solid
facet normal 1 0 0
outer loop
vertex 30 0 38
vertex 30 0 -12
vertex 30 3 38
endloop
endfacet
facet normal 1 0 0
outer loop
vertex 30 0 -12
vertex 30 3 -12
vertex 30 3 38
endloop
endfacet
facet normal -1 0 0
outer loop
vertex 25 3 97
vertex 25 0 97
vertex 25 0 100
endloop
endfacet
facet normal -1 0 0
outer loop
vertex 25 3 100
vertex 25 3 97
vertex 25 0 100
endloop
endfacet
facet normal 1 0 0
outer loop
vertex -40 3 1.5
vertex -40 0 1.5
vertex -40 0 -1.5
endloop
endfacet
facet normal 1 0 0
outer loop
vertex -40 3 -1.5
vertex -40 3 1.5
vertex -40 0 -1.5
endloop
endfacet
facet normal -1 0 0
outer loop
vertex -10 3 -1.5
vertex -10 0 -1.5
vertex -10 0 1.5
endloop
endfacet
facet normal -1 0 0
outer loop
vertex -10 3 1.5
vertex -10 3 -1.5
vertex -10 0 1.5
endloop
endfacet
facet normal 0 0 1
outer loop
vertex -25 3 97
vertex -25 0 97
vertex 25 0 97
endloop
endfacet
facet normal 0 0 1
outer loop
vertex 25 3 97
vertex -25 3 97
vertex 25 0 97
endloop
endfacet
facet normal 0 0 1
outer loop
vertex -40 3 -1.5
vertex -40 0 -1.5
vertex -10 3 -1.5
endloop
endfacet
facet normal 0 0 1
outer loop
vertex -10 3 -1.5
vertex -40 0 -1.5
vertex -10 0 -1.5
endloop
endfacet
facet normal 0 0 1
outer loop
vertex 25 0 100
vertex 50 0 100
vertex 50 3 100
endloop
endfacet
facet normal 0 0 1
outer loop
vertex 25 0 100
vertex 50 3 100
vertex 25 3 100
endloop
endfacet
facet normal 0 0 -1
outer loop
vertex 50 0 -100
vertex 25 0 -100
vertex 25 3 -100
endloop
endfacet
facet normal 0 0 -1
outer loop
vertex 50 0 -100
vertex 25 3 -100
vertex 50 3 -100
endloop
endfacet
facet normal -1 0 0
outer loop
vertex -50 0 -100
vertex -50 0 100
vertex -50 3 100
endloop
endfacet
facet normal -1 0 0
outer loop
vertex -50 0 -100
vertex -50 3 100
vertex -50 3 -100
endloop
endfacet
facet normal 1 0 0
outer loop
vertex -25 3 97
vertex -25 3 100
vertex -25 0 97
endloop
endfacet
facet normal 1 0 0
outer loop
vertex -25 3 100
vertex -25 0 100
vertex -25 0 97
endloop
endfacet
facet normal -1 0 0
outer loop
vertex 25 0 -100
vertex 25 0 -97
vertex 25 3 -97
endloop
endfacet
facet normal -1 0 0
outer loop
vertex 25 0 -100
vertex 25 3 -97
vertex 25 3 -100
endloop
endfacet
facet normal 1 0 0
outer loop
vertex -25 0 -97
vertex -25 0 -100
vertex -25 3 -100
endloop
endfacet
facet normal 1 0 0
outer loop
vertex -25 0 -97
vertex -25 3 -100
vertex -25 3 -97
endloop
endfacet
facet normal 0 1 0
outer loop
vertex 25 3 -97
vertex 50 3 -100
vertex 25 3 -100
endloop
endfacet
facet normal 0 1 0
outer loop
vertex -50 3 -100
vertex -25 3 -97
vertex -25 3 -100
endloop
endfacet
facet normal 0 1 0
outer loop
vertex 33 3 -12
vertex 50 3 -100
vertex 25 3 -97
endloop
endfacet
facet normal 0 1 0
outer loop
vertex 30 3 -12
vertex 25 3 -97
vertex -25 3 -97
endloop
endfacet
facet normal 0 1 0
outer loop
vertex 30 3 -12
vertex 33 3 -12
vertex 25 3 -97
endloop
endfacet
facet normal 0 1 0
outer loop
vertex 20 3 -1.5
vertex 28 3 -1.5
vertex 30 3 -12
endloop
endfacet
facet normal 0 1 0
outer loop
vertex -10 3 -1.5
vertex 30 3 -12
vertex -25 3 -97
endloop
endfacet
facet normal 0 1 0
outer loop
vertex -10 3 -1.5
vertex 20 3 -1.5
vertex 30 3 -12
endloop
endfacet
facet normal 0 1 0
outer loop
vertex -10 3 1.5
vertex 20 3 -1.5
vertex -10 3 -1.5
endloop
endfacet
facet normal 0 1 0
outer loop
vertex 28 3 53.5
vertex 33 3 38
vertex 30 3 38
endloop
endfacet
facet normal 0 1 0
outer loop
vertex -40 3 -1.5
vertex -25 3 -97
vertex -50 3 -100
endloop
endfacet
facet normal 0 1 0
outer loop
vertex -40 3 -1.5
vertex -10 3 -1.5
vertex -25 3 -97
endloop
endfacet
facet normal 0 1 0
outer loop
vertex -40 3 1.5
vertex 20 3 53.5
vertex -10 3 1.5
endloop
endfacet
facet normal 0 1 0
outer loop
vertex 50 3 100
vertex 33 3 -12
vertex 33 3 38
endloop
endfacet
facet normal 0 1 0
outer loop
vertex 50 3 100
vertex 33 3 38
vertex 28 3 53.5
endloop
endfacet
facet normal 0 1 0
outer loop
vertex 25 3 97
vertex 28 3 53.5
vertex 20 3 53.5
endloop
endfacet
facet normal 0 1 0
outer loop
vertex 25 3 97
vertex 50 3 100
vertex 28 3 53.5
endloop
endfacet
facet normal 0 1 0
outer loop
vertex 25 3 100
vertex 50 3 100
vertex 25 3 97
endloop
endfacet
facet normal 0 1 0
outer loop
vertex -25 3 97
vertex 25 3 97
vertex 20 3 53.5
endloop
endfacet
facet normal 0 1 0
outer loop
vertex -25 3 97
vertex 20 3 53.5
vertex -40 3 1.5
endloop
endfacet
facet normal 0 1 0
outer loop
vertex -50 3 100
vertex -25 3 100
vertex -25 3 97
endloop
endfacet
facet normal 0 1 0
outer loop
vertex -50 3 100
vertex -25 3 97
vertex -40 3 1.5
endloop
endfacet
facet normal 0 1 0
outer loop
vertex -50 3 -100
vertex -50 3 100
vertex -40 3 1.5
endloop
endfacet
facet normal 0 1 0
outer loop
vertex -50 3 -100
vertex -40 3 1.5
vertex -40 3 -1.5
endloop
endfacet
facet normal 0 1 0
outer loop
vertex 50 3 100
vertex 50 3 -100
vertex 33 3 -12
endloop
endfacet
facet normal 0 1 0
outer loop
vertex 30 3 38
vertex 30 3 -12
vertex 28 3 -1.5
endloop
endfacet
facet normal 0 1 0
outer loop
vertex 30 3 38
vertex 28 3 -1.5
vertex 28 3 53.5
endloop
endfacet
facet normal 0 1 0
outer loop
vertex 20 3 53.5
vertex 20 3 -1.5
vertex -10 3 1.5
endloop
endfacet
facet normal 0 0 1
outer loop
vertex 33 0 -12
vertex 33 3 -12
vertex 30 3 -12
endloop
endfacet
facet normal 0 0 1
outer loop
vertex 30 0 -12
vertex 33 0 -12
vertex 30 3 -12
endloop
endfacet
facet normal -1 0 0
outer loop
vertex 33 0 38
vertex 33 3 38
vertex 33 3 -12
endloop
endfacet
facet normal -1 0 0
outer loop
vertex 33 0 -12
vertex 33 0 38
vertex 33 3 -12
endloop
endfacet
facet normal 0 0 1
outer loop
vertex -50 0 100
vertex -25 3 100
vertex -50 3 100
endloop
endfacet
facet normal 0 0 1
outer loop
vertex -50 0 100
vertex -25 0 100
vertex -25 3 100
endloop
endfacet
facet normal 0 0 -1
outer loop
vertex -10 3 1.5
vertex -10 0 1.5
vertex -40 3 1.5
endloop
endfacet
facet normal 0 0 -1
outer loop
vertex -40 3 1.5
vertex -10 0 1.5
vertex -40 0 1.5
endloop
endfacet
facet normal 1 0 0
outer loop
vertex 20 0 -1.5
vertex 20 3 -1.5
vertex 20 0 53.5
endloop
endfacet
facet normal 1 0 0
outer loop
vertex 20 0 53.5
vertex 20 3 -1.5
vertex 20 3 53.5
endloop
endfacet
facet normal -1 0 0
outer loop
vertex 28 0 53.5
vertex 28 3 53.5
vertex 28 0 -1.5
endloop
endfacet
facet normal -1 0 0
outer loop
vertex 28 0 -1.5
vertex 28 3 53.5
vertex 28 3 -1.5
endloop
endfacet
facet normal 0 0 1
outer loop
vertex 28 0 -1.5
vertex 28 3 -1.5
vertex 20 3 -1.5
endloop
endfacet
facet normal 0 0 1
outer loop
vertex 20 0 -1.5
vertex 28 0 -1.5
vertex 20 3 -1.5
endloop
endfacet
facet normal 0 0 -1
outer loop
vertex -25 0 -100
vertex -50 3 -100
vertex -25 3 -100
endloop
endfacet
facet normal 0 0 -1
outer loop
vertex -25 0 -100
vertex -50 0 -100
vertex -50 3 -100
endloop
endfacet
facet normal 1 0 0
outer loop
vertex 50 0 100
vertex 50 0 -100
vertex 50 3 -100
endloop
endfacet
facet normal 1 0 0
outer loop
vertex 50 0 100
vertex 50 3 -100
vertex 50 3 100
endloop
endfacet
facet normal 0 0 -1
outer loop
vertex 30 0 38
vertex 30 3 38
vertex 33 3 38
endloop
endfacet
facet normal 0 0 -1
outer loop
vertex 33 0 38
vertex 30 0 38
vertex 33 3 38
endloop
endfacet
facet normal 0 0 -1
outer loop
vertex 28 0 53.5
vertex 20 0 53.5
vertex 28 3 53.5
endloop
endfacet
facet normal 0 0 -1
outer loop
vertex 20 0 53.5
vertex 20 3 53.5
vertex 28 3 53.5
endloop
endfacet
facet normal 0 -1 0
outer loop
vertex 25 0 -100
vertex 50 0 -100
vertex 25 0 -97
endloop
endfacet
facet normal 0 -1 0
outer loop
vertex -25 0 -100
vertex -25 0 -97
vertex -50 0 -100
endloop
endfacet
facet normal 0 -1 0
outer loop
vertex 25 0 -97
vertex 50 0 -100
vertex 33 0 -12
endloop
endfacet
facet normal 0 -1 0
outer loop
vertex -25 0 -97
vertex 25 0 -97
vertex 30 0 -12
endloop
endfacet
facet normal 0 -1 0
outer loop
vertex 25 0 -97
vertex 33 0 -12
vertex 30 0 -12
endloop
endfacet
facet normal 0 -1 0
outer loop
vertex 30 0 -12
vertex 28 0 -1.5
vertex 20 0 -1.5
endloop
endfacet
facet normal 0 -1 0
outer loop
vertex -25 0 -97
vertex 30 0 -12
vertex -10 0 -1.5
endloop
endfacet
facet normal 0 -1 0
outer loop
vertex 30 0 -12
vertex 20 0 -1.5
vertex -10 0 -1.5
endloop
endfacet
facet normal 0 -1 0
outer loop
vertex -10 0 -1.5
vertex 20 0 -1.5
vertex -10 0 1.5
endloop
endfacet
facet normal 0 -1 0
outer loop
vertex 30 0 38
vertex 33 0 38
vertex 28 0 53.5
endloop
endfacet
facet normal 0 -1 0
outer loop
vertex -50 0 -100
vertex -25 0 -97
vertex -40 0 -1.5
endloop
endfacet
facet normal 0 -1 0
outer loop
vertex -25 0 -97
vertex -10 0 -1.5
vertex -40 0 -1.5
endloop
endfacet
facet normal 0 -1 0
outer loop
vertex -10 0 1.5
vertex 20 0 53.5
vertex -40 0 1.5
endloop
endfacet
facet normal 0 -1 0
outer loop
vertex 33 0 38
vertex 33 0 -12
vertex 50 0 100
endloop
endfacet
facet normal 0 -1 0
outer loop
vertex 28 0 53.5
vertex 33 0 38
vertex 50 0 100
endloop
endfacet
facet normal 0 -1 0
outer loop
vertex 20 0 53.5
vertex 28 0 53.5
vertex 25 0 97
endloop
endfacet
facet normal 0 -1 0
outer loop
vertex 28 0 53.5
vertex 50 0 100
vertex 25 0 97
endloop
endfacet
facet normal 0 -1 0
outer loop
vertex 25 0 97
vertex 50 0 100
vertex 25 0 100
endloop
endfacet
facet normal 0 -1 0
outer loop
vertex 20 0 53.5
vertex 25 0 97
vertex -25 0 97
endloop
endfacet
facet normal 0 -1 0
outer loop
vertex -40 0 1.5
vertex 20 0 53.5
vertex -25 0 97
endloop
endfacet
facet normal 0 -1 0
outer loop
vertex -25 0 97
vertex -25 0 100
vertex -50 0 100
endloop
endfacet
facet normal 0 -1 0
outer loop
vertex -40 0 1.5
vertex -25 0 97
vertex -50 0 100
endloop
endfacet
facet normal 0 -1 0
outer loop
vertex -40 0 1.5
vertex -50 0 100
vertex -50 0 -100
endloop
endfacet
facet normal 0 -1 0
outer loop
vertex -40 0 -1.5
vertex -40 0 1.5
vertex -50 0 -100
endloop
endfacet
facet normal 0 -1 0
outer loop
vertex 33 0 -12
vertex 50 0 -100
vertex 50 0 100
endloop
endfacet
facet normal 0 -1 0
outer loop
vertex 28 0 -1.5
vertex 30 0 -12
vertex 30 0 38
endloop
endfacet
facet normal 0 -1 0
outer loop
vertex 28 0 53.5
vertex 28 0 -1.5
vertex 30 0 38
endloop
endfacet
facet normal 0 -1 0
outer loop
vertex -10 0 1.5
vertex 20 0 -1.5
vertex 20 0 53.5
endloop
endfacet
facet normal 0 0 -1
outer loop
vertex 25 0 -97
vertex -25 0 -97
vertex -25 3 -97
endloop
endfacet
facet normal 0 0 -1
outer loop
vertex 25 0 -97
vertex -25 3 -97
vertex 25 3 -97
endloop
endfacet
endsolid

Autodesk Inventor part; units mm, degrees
ref_plane "YZ Plane" through (0, 0, 0) normal (1, 0, 0) x (0, 1, 0)
ref_plane "XZ Plane" through (0, 0, 0) normal (0, 1, 0) x (-1, 0, 0)
ref_plane "XY Plane" through (0, 0, 0) normal (0, 0, 1) x (1, 0, 0)
sketch "Boceto1" plane through (0, 0, 0) normal (0, 1, 0) x (-1, 0, 0)
  line L0 (50, 100) -> (50, -100)
  line L1 (-50, 100) -> (50, -100) construction
  line L2 (50, 100) -> (-50, -100) construction
  line L3 (25, 100) -> (25, 97)
  line L4 (25, 97) -> (-25, 97)
  line L5 (-25, 97) -> (-25, 100)
  line L6 (-50, 100) -> (-25, 100)
  line L7 (25, 100) -> (50, 100)
  line L8 (25, -100) -> (25, -97)
  line L9 (25, -97) -> (-25, -97)
  line L10 (-25, -97) -> (-25, -100)
  line L11 (50, -100) -> (25, -100)
  line L12 (-25, -100) -> (-50, -100)
  line L13 (-50, -100) -> (-50, 100)
  point P0 (0, 0)
  dimension "d0" = 100
  dimension "d1" = 200
  dimension "d4" = 3
  dimension "d5" = 50
  dimension "d7" = 3
  dimension "d8" = 50
  dimension "d12" = 25
extrude "Extrusión1" add sketch "Boceto1" along normal blind 3
sketch "Boceto2" plane through (0, 3, 0) normal (0, 1, 0) x (1, 0, 0)
  line L0 (33, 12) -> (30, 12)
  line L1 (30, 12) -> (30, -38)
  line L2 (30, -38) -> (33, -38)
  line L3 (33, -38) -> (33, 12)
  line L4 (50, 100) -> (25, 100) projected
  line L5 (-50, 100) -> (-50, -100) projected
  point P0 (0, 0)
  dimension "d17" = 3
  dimension "d18" = 50
  dimension "d19" = 88
  dimension "d20" = 80
extrude "Extrusión2" cut sketch "Boceto2" against normal blind 3
sketch "Boceto3" plane through (0, 0, 0) normal (0, -1, 0) x (1, 0, 0)
  line L0 (-40, -1.5) -> (-10, -1.5)
  line L1 (-10, -1.5) -> (-10, 1.5)
  line L2 (-10, 1.5) -> (-40, 1.5)
  line L3 (-40, 1.5) -> (-40, -1.5)
  line L4 (-50, -100) -> (-25, -100) projected
  line L5 (30, -12) -> (30, 38) projected
  point P0 (0, 0)
  dimension "d23" = 30
  dimension "d24" = 3
  dimension "d25" = 98.5
  dimension "d26" = 40
extrude "Extrusión3" cut sketch "Boceto3" against normal blind 3
sketch "Boceto4" plane through (0, 3, 0) normal (0, 1, 0) x (1, 0, 0)
  line L0 (28, 1.5) -> (20, 1.5)
  line L1 (20, 1.5) -> (20, -53.5)
  line L2 (20, -53.5) -> (28, -53.5)
  line L3 (28, -53.5) -> (28, 1.5)
  line L4 (-25, -97) -> (25, -97) projected
  line L5 (30, -38) -> (30, 12) projected
  line L6 (28, -26) -> (20, -26) construction
  line L7 (25, -100) -> (50, -100) projected
  point P0 (0, 0)
  dimension "d29" = 55
  dimension "d30" = 8
  dimension "d32" = 2
  dimension "d35" = 74
extrude "Extrusión4" cut sketch "Boceto4" against normal blind 3
properties part number "Piso"
